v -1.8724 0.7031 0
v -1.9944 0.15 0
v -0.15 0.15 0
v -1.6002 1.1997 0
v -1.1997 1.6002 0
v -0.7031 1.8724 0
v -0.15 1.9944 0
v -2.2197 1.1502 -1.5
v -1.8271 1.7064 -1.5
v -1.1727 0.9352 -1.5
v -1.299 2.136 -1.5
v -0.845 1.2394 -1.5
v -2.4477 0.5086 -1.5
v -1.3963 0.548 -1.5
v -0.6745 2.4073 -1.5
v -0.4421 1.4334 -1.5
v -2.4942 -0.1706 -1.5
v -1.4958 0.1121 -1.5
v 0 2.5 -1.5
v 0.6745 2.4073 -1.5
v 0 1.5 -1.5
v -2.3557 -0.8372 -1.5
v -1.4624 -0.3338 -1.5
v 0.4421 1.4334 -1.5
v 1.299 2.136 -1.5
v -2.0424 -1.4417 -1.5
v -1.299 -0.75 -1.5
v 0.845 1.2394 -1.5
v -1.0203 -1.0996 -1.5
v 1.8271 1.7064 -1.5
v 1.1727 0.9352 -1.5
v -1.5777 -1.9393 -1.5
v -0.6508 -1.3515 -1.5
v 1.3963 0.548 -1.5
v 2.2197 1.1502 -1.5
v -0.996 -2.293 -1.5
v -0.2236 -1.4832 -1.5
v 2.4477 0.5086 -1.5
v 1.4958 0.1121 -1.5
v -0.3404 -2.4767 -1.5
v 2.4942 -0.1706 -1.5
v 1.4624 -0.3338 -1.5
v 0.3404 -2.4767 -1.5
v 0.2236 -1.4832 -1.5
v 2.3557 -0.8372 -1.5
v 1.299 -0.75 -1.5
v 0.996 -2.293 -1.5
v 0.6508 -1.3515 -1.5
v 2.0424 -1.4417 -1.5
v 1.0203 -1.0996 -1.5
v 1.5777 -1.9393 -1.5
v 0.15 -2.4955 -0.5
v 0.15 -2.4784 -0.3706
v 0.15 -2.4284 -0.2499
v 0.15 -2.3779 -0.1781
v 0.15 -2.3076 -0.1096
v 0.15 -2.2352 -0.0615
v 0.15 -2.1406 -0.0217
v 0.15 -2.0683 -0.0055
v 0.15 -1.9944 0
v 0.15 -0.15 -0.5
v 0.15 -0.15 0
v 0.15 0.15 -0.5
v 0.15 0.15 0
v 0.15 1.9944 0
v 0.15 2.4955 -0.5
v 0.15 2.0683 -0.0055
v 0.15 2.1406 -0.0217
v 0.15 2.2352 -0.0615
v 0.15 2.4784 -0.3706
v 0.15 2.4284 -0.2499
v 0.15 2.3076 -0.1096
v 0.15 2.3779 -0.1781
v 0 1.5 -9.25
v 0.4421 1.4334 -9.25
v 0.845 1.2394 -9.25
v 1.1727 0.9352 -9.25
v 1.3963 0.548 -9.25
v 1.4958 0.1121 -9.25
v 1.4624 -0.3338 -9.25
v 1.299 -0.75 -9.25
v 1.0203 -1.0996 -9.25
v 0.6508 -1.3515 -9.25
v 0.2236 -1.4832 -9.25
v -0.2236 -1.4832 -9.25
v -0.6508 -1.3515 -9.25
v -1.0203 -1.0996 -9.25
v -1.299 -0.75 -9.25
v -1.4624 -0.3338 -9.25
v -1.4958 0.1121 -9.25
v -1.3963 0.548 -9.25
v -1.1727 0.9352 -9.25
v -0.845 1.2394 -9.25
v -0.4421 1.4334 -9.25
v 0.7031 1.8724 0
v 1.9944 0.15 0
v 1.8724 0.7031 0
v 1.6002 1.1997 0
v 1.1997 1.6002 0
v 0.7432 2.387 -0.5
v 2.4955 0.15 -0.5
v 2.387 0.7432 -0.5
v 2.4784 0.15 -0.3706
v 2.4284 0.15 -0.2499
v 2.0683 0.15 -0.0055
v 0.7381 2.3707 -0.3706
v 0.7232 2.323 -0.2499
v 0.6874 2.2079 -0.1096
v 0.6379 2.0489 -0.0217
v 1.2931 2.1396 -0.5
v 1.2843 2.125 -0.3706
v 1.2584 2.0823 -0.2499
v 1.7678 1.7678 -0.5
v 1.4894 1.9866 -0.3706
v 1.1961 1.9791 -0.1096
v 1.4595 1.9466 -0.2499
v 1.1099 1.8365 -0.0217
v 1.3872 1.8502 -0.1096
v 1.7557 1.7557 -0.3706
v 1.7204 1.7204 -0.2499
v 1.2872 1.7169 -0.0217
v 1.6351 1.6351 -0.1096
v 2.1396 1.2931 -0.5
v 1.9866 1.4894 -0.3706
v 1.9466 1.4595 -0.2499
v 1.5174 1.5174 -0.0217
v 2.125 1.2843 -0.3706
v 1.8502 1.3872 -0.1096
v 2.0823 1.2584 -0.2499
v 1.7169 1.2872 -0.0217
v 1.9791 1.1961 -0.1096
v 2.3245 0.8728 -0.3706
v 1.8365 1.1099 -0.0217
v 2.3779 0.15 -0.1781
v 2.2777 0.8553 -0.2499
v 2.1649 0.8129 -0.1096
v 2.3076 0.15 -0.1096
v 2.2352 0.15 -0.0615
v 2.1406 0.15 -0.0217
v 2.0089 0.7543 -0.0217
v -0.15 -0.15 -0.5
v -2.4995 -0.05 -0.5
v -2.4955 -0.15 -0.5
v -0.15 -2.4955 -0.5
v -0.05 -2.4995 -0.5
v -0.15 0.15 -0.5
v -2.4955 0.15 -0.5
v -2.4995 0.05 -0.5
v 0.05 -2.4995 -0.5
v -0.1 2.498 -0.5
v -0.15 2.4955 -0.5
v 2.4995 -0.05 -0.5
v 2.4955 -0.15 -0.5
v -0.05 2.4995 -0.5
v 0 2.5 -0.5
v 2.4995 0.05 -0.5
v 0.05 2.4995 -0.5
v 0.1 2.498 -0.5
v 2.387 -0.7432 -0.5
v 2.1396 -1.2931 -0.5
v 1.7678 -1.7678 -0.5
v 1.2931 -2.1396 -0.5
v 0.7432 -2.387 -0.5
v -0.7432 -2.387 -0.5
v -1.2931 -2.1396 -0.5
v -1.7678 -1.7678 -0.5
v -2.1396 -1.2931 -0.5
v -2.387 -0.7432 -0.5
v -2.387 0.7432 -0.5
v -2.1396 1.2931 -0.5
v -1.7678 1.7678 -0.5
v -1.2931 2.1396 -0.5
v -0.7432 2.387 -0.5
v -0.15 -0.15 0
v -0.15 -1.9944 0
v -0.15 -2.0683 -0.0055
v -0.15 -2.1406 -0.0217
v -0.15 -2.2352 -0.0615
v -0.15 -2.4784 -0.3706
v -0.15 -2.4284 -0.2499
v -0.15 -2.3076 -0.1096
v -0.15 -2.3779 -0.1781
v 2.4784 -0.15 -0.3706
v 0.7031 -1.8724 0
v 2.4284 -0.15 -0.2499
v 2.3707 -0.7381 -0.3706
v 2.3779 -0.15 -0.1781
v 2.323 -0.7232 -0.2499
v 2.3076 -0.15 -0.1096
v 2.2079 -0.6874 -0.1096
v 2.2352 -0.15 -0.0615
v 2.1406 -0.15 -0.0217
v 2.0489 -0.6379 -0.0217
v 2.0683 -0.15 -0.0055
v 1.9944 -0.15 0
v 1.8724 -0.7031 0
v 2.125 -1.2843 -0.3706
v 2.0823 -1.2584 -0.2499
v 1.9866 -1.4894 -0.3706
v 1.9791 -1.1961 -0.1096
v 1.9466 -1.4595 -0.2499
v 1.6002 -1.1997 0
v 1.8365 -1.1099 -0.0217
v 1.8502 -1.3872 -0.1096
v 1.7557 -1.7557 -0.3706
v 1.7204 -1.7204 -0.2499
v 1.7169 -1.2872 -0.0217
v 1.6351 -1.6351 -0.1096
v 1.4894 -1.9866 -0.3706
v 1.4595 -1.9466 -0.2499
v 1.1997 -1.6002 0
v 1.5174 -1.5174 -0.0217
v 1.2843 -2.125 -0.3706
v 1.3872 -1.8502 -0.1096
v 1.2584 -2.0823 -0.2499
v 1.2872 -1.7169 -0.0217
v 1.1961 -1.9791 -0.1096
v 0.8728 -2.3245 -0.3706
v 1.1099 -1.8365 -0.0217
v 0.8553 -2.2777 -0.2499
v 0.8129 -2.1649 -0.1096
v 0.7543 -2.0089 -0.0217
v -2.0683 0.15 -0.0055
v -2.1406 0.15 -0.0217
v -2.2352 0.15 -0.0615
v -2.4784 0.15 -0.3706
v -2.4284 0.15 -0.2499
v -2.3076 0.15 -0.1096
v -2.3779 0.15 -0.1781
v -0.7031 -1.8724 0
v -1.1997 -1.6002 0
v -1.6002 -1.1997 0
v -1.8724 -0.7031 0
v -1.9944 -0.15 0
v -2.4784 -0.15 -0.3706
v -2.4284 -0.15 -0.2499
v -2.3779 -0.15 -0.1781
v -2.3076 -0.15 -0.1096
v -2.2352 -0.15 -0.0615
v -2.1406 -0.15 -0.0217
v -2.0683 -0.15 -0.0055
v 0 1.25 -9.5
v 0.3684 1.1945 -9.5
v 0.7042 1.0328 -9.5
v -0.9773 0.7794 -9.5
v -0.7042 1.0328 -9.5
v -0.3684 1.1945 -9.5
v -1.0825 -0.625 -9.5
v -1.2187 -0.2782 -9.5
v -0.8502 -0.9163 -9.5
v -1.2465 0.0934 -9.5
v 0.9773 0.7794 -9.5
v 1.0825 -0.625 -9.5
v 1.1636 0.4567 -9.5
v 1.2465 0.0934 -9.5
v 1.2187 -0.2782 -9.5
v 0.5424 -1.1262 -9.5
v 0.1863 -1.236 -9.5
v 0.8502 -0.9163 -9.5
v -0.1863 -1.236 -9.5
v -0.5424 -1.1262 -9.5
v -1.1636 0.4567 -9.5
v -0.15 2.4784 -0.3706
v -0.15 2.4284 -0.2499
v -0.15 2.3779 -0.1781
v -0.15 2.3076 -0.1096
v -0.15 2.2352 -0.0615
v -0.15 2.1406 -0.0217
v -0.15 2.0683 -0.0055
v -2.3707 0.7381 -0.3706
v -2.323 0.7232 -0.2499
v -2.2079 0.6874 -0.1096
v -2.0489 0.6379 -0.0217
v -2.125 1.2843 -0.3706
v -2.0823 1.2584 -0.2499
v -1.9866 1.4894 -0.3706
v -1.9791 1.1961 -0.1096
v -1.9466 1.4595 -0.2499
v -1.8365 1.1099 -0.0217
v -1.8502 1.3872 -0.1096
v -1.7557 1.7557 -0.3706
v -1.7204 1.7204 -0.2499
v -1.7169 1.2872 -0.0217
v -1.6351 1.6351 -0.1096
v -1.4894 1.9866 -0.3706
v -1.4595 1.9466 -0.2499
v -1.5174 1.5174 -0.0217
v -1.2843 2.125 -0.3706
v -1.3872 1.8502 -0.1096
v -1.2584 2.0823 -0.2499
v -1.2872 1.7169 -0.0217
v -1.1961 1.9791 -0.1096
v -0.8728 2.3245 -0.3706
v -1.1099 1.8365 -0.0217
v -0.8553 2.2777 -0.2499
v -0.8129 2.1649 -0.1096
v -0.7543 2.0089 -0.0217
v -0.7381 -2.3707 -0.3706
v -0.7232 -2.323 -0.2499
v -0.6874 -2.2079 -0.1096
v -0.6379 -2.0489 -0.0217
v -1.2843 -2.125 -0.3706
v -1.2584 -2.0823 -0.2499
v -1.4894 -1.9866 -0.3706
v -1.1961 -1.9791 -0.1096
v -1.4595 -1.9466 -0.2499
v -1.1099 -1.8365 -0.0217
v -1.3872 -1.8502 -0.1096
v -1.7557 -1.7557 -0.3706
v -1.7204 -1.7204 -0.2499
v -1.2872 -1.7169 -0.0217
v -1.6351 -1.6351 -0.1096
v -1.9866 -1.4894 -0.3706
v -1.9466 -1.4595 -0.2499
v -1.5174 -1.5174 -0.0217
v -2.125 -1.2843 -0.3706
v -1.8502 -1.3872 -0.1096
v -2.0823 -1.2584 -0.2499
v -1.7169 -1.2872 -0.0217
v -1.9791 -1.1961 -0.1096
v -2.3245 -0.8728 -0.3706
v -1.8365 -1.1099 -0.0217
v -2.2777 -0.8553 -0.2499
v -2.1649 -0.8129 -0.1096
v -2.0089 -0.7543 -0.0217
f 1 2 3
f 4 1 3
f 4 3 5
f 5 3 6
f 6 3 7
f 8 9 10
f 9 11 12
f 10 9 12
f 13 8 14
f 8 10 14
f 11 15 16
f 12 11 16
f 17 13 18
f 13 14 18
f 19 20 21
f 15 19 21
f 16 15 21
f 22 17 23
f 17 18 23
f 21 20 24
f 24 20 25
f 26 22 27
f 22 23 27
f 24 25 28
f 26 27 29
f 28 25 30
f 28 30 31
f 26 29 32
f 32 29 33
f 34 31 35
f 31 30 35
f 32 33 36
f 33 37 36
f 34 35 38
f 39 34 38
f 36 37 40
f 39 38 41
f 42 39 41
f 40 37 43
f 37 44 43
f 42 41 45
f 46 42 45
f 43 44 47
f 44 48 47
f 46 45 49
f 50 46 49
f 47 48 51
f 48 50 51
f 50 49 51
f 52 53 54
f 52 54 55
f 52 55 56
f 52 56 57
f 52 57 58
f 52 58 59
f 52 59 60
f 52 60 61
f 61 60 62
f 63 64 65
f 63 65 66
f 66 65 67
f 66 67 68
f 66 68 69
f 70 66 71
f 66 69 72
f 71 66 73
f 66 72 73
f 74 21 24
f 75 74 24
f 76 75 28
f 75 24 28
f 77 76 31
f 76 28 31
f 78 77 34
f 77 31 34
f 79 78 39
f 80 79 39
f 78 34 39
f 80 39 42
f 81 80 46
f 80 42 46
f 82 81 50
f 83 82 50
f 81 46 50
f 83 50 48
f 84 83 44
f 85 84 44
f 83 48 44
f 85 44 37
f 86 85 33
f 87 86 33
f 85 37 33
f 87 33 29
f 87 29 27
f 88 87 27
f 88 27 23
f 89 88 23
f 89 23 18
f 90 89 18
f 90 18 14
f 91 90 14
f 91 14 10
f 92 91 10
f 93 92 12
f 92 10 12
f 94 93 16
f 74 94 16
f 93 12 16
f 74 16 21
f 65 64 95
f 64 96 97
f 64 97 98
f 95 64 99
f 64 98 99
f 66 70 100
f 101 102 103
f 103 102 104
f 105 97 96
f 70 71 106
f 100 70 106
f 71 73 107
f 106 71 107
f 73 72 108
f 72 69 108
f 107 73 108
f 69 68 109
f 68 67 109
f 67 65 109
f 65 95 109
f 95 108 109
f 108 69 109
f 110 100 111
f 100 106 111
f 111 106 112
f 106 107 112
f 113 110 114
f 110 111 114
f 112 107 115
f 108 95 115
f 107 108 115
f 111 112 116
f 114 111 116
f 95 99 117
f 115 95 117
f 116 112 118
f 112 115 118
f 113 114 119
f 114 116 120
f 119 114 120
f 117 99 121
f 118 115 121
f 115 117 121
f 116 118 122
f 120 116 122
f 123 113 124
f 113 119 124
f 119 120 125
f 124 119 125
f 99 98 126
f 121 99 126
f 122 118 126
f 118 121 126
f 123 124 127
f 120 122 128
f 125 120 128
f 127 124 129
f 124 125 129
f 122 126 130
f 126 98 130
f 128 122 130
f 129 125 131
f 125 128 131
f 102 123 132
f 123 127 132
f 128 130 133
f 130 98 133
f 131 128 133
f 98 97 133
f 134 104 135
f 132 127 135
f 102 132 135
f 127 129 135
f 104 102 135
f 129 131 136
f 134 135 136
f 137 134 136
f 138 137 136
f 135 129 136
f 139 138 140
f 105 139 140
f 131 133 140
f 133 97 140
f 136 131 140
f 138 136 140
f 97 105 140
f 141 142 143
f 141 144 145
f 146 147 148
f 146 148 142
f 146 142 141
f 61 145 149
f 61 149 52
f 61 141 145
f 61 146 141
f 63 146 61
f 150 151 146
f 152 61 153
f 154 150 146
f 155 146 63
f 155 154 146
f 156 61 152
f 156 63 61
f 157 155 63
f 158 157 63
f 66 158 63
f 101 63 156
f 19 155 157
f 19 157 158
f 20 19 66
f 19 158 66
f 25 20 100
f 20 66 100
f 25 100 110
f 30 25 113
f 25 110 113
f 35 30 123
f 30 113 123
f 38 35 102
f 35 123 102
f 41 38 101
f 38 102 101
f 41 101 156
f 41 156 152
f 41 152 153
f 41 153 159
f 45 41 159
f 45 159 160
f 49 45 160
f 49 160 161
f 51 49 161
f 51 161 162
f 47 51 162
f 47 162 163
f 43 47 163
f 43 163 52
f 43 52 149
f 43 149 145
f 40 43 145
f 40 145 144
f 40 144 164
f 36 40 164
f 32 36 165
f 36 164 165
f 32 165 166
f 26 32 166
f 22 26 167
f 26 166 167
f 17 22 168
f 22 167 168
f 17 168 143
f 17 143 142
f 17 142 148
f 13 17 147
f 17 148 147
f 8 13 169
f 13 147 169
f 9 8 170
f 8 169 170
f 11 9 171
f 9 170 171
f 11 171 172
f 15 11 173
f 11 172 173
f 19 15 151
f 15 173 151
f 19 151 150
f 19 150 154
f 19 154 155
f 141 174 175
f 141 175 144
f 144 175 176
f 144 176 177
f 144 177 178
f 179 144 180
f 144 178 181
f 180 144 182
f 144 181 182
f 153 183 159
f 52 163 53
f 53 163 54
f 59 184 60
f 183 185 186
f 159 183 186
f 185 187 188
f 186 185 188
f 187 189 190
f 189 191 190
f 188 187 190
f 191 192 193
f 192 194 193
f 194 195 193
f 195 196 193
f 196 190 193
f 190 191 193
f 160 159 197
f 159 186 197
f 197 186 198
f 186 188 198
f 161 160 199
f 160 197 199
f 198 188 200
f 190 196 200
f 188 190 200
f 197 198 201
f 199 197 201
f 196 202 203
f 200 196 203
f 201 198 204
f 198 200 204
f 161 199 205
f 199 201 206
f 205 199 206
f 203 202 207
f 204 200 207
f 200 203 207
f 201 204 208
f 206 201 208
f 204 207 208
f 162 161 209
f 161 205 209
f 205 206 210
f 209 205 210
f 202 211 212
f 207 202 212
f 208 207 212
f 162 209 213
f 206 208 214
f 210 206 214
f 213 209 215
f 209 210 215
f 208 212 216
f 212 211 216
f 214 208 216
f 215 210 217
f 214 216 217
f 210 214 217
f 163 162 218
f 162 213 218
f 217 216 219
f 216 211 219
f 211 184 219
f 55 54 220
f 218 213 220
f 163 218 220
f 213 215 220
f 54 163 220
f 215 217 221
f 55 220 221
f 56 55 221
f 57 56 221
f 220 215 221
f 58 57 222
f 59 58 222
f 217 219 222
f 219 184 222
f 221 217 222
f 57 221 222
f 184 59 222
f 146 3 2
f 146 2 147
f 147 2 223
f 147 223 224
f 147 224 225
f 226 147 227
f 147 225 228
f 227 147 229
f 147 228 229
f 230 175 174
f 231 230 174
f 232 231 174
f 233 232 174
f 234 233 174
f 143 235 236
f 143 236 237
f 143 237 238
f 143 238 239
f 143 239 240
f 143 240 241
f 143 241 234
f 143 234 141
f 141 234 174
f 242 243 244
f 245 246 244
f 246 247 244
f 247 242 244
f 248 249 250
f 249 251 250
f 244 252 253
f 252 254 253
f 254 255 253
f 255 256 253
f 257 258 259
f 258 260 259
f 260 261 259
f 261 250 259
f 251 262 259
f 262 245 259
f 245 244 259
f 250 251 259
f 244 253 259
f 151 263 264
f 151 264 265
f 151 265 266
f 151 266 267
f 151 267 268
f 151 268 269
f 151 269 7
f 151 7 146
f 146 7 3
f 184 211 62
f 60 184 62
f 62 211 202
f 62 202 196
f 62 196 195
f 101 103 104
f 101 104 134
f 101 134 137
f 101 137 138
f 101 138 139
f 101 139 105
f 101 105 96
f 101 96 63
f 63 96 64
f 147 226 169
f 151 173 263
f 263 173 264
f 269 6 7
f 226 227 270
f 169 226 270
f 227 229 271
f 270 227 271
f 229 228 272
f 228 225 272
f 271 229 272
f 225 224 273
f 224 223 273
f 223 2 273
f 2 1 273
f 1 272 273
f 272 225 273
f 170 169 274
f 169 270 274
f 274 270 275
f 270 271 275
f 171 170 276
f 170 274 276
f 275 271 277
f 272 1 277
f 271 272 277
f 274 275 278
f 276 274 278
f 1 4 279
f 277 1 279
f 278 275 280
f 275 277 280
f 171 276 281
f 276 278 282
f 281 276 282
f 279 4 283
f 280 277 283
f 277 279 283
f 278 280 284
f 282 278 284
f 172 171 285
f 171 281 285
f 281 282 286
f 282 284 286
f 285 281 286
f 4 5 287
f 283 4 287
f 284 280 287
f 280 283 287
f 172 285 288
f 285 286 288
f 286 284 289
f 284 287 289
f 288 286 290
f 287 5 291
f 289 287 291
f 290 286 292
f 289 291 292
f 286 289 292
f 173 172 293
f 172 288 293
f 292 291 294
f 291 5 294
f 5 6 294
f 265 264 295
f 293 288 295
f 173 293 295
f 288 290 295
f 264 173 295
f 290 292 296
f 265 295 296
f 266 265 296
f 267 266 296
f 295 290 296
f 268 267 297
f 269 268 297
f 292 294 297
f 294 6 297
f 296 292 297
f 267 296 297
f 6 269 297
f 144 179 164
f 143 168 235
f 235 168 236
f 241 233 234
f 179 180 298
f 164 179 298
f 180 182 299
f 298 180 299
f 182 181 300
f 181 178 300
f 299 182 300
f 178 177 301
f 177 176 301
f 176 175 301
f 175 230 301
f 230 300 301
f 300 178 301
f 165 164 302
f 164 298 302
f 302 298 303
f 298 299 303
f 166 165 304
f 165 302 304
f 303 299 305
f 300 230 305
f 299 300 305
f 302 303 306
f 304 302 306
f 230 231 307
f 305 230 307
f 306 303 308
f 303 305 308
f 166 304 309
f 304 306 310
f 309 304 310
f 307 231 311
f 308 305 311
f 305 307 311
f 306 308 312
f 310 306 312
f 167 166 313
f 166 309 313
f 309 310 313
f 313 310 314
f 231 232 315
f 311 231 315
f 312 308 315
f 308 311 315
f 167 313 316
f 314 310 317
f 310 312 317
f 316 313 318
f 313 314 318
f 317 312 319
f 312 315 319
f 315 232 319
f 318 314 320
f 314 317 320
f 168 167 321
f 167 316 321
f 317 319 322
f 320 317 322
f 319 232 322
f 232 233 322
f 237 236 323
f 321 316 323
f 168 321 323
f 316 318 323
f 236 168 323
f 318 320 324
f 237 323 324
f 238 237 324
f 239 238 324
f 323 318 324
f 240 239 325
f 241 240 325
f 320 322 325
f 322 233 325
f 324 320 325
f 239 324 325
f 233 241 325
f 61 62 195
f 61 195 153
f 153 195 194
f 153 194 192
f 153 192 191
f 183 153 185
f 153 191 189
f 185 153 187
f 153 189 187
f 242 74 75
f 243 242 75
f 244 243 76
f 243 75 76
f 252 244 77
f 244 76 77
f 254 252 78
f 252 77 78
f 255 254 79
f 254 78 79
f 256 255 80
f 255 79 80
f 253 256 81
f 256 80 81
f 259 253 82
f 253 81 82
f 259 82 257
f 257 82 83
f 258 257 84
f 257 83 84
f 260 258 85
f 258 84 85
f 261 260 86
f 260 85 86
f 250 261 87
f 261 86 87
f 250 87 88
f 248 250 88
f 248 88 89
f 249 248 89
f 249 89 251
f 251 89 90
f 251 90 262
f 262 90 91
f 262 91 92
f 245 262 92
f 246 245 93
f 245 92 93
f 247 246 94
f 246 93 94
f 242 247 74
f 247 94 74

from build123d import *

# Parameters (mm, degrees)
CHAMFER1_SIZE      = 0.25
CUT_EXTRUDE1_DEPTH = 0.5
FILLET7_R          = 0.5


with BuildPart() as part:
    # Sketch1 → Revolve1 (revolve)
    with BuildSketch(Plane(origin=(0, 0, 0), x_dir=(0, 0, -1), z_dir=(1, 0, 0))):
        Polygon((9.5, 0), (9.5, 1.5), (1.5, 1.5), (1.5, 2.5), (0, 2.5), (0, 0), align=None)
    revolve(axis=Axis((0, 0, 0), (0, 0, -1)))

    # Chamfer1
    chamfer1_edges = [part.edges().sort_by_distance(p)[0] for p in [
        (0, -1.5, -9.5),
    ]]
    chamfer(chamfer1_edges, length=CHAMFER1_SIZE)

    # Sketch2 → Cut-Extrude1 (cut)
    with BuildSketch(Plane.XY):
        with BuildLine():
            Line((-0.15, 2.495495943), (-0.15, 0.15))
            Line((-0.15, 0.15), (-2.495495943, 0.15))
            ThreePointArc((-2.495495943, 0.15), (-2.5, 0), (-2.495495943, -0.15))
            Line((-2.495495943, -0.15), (-0.15, -0.15))
            Line((-0.15, -0.15), (-0.15, -2.495495943))
            ThreePointArc((-0.15, -2.495495943), (0, -2.5), (0.15, -2.495495943))
            Line((0.15, -2.495495943), (0.15, -0.15))
            Line((0.15, -0.15), (2.495495943, -0.15))
            ThreePointArc((2.495495943, -0.15), (2.5, 0), (2.495495943, 0.15))
            Line((2.495495943, 0.15), (0.15, 0.15))
            Line((0.15, 0.15), (0.15, 2.495495943))
            ThreePointArc((0.15, 2.495495943), (0, 2.5), (-0.15, 2.495495943))
        make_face()
    extrude(amount=-CUT_EXTRUDE1_DEPTH, mode=Mode.SUBTRACT)

    # Fillet7
    fillet7_edges = [part.edges().sort_by_distance(p)[0] for p in [
        (-1.767766953, -1.767766953, 0),
        (1.767766953, -1.767766953, 0),
        (1.767766953, 1.767766953, 0),
        (-1.767766953, 1.767766953, 0),
    ]]
    fillet(fillet7_edges, radius=FILLET7_R)


solid = part.part
